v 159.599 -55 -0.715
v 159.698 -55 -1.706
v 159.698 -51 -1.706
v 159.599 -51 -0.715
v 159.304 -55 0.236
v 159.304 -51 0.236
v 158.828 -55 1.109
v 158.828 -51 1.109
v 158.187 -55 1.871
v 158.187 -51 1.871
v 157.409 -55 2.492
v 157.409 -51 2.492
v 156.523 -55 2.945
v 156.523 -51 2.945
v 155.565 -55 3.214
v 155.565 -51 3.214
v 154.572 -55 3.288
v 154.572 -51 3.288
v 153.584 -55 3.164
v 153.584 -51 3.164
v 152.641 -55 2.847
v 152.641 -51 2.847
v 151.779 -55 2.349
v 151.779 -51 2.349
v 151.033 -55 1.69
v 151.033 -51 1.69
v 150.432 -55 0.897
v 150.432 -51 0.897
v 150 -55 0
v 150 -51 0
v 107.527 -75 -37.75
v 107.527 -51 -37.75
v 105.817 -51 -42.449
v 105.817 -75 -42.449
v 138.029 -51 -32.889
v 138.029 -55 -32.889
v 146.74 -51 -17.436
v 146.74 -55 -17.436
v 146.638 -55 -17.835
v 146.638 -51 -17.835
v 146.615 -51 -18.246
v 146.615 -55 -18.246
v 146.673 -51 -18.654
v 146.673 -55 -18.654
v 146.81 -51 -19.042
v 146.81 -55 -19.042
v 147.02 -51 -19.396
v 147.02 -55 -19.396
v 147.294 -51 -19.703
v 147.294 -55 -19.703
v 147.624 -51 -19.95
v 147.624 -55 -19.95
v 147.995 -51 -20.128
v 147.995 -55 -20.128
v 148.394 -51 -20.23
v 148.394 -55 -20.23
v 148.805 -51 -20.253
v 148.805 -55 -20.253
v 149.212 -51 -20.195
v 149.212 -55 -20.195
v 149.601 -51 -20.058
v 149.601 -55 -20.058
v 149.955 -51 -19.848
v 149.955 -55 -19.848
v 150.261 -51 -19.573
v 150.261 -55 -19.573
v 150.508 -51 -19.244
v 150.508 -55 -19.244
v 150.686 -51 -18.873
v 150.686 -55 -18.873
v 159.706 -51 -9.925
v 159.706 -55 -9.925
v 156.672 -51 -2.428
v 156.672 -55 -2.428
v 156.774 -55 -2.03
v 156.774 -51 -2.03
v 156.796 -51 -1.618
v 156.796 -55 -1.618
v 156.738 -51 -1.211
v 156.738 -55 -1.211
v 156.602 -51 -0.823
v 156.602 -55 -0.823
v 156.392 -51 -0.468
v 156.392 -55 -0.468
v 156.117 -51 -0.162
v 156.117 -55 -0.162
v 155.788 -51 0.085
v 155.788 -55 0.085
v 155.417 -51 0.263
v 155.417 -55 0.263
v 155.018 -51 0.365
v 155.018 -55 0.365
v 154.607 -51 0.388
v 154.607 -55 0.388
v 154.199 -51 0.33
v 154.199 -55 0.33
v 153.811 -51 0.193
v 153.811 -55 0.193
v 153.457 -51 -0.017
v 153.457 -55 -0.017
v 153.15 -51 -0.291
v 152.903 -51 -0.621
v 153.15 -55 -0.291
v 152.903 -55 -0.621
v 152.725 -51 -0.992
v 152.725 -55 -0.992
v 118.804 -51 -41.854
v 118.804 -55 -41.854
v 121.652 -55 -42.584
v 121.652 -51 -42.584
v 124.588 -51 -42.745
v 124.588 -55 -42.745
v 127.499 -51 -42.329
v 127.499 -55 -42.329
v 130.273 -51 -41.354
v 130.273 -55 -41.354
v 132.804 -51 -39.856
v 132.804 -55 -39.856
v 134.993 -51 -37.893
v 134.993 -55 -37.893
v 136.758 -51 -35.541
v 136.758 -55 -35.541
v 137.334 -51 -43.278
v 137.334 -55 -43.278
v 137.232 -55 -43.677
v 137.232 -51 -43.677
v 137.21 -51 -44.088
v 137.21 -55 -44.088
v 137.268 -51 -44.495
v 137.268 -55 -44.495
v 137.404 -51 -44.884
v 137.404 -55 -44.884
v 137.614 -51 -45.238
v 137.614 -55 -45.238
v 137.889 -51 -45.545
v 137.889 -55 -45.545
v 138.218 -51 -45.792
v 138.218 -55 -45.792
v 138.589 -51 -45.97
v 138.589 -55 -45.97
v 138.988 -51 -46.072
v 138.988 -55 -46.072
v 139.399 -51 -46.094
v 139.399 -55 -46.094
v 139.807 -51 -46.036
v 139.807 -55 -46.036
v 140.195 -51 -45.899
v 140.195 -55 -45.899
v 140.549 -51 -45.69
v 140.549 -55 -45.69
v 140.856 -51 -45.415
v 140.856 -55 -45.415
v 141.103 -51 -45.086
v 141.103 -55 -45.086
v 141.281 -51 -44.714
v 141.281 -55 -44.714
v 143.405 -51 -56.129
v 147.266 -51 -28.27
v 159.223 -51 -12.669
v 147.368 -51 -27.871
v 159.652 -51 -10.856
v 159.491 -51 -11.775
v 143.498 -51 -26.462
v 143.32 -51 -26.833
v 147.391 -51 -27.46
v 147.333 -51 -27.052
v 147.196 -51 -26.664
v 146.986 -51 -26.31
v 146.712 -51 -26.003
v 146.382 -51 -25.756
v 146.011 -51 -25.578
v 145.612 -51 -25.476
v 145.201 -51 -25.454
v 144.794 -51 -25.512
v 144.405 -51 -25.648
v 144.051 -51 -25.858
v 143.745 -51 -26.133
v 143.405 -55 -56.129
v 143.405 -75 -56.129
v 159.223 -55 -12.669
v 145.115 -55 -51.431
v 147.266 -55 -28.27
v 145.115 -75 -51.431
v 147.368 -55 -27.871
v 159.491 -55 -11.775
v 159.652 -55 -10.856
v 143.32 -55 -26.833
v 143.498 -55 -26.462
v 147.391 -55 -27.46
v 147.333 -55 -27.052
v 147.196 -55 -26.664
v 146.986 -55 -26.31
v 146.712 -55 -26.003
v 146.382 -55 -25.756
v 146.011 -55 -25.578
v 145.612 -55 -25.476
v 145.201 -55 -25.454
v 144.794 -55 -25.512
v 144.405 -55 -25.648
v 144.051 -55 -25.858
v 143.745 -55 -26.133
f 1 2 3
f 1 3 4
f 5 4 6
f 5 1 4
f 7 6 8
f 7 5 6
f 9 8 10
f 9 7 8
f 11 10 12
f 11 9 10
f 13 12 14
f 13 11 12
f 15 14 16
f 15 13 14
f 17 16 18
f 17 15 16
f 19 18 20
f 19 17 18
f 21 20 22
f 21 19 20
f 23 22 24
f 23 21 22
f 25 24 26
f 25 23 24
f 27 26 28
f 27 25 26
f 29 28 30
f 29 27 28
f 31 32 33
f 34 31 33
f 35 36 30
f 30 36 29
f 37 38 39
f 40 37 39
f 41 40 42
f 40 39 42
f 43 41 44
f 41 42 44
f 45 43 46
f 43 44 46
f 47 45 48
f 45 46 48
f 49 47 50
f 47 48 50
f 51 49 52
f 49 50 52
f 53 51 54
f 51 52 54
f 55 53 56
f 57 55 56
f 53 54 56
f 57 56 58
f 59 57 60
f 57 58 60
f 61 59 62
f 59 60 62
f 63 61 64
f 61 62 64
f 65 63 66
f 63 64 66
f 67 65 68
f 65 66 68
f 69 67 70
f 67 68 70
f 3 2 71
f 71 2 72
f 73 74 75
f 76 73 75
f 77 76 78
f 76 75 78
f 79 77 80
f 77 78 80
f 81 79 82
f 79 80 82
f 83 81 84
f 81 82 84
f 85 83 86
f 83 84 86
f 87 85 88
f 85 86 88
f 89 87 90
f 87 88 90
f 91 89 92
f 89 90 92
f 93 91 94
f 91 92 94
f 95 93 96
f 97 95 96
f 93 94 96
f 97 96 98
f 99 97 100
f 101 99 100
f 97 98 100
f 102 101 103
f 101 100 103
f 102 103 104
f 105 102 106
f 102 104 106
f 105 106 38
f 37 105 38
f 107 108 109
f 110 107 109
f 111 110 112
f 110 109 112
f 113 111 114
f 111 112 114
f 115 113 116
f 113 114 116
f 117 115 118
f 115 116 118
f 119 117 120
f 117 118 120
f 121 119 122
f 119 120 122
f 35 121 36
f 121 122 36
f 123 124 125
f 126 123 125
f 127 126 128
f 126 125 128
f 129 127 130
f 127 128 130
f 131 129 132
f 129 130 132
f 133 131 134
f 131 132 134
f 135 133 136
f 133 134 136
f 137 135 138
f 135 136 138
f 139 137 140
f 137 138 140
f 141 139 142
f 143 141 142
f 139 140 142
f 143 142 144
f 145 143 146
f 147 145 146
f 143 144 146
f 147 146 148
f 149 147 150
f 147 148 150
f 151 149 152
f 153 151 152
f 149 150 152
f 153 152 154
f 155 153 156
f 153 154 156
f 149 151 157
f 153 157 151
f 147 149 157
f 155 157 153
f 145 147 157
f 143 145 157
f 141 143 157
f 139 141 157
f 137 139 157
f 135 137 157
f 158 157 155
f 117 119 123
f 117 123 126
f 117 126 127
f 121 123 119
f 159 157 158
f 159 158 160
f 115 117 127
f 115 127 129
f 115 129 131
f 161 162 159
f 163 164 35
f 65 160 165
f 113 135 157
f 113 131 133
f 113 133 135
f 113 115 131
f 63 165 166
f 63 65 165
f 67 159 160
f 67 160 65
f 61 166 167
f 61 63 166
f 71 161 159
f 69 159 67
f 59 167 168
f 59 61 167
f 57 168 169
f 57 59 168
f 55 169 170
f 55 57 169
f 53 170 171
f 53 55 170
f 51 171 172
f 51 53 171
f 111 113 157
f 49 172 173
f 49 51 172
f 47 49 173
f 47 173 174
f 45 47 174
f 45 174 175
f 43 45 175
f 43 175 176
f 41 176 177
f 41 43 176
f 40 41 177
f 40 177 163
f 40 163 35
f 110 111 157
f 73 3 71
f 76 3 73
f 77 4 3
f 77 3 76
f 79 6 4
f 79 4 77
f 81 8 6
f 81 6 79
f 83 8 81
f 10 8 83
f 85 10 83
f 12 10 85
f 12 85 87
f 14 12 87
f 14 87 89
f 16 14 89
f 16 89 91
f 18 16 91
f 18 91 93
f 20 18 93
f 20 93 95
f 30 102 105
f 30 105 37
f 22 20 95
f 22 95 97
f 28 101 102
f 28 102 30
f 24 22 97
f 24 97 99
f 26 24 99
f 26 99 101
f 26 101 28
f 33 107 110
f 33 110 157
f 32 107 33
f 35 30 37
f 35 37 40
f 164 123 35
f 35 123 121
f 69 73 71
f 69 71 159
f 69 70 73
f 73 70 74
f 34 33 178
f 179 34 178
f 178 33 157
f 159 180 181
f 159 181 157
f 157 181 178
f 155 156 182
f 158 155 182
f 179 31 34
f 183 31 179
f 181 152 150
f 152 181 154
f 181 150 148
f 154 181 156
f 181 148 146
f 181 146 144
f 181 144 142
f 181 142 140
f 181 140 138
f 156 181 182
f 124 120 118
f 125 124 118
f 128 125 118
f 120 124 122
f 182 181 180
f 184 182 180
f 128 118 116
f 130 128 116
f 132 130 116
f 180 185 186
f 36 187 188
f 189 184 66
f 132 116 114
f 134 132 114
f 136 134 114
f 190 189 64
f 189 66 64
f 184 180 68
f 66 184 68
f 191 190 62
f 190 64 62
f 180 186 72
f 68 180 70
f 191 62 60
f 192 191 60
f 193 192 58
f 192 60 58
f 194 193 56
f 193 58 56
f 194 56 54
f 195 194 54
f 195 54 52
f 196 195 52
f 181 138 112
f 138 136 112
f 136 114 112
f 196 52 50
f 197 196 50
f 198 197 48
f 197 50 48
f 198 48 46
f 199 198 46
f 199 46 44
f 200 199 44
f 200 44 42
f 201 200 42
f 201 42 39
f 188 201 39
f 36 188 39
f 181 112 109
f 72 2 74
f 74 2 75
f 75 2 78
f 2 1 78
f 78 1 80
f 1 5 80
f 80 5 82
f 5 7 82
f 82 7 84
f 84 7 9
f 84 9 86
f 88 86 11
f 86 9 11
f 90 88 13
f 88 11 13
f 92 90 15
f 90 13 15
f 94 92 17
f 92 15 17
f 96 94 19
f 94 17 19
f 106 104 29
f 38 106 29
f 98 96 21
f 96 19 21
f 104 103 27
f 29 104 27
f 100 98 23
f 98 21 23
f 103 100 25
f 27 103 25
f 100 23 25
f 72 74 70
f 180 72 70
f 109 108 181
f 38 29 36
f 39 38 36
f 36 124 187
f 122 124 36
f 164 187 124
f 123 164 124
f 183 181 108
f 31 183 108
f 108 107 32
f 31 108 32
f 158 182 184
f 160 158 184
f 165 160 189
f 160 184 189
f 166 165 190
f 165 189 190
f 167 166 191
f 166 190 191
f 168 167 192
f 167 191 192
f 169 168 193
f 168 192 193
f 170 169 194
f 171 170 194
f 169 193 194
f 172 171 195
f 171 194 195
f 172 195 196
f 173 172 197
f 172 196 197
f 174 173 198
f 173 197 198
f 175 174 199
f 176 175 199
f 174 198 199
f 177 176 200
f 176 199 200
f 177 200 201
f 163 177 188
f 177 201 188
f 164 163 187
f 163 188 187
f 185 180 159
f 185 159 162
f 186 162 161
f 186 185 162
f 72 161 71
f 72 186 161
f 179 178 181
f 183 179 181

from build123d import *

# Parameters (mm, degrees)
PAD039_DEPTH = 4
PAD040_DEPTH = 20


with BuildPart() as tentingfoot:
    # Sketch060 → Pad039 (new body)
    with BuildSketch(Plane.XZ):
        with BuildLine():
            ThreePointArc((-21.1964126557, -41.8543733369), (-9.7268365797, -41.3536008307), (-1.970721194, -32.889286175))
            Line((-1.970721194, -32.889286175), (10, 0))
            ThreePointArc((19.6984611198, -1.705646413), (15.5645105895, 3.2143243008), (10, 0))
            Line((19.6984611198, -1.705646413), (19.7057836753, -9.9252842627))
            ThreePointArc((19.2233278161, -12.6685722951), (19.5848668778, -11.3180871255), (19.7057836753, -9.9252842627))
            Line((19.2233278161, -12.6685722951), (3.4048800097, -56.129400454))
            Line((-34.1828248217, -42.448594721), (3.4048800097, -56.129400454))
            Line((-32.4727241051, -37.750131617), (-34.1828248217, -42.448594721))
            Line((-21.1964126557, -41.8543733369), (-32.4727241051, -37.750131617))
        make_face()
        with BuildLine():
            ThreePointArc((16.6718176076, -2.4283430176), (15.4167054049, 0.263253787), (12.7251086003, -0.9918584156))
            Line((12.7251086003, -0.9918584156), (6.7397560921, -17.4364792794))
            ThreePointArc((6.7397560921, -17.4364792794), (7.9948682947, -20.128076084), (10.6864650994, -18.8729638814))
            Line((10.6864650994, -18.8729638814), (16.6718176076, -2.4283430176))
        make_face(mode=Mode.SUBTRACT)
        with BuildLine():
            ThreePointArc((7.2662547771, -28.2698888178), (6.0111449398, -25.5782909102), (3.3195470322, -26.8334007475))
            Line((3.3195470322, -26.8334007475), (-2.6658199272, -43.2780163515))
            ThreePointArc((-2.6658199272, -43.2780163515), (-1.4107100899, -45.9696142591), (1.2808878177, -44.7145044217))
            Line((1.2808878177, -44.7145044217), (7.2662547771, -28.2698888178))
        make_face(mode=Mode.SUBTRACT)
    extrude(amount=PAD039_DEPTH)

    # Sketch061 → Pad040 (join)
    with BuildSketch(Plane.XZ):
        Polygon((5.1149807264, -51.4309373501), (-32.4727241051, -37.750131617), (-34.1828248217, -42.448594721), (3.4048800097, -56.129400454), align=None)
    extrude(amount=-PAD040_DEPTH)


with BuildPart() as tentingfoot_1:
    # Body013 placement: moved
    add(tentingfoot.part.moved(Location((140, 55, 0))))


with BuildPart() as part_mirroring001:
    # Part__Mirroring001: instance of TentingFoot
    add(tentingfoot_1.part.mirror(Plane(origin=(133.8426055908, 1.9073e-06, -12.4421358109), x_dir=(1, 0, 0), z_dir=(0, 1, -1.192e-07))))


solid = part_mirroring001.part
